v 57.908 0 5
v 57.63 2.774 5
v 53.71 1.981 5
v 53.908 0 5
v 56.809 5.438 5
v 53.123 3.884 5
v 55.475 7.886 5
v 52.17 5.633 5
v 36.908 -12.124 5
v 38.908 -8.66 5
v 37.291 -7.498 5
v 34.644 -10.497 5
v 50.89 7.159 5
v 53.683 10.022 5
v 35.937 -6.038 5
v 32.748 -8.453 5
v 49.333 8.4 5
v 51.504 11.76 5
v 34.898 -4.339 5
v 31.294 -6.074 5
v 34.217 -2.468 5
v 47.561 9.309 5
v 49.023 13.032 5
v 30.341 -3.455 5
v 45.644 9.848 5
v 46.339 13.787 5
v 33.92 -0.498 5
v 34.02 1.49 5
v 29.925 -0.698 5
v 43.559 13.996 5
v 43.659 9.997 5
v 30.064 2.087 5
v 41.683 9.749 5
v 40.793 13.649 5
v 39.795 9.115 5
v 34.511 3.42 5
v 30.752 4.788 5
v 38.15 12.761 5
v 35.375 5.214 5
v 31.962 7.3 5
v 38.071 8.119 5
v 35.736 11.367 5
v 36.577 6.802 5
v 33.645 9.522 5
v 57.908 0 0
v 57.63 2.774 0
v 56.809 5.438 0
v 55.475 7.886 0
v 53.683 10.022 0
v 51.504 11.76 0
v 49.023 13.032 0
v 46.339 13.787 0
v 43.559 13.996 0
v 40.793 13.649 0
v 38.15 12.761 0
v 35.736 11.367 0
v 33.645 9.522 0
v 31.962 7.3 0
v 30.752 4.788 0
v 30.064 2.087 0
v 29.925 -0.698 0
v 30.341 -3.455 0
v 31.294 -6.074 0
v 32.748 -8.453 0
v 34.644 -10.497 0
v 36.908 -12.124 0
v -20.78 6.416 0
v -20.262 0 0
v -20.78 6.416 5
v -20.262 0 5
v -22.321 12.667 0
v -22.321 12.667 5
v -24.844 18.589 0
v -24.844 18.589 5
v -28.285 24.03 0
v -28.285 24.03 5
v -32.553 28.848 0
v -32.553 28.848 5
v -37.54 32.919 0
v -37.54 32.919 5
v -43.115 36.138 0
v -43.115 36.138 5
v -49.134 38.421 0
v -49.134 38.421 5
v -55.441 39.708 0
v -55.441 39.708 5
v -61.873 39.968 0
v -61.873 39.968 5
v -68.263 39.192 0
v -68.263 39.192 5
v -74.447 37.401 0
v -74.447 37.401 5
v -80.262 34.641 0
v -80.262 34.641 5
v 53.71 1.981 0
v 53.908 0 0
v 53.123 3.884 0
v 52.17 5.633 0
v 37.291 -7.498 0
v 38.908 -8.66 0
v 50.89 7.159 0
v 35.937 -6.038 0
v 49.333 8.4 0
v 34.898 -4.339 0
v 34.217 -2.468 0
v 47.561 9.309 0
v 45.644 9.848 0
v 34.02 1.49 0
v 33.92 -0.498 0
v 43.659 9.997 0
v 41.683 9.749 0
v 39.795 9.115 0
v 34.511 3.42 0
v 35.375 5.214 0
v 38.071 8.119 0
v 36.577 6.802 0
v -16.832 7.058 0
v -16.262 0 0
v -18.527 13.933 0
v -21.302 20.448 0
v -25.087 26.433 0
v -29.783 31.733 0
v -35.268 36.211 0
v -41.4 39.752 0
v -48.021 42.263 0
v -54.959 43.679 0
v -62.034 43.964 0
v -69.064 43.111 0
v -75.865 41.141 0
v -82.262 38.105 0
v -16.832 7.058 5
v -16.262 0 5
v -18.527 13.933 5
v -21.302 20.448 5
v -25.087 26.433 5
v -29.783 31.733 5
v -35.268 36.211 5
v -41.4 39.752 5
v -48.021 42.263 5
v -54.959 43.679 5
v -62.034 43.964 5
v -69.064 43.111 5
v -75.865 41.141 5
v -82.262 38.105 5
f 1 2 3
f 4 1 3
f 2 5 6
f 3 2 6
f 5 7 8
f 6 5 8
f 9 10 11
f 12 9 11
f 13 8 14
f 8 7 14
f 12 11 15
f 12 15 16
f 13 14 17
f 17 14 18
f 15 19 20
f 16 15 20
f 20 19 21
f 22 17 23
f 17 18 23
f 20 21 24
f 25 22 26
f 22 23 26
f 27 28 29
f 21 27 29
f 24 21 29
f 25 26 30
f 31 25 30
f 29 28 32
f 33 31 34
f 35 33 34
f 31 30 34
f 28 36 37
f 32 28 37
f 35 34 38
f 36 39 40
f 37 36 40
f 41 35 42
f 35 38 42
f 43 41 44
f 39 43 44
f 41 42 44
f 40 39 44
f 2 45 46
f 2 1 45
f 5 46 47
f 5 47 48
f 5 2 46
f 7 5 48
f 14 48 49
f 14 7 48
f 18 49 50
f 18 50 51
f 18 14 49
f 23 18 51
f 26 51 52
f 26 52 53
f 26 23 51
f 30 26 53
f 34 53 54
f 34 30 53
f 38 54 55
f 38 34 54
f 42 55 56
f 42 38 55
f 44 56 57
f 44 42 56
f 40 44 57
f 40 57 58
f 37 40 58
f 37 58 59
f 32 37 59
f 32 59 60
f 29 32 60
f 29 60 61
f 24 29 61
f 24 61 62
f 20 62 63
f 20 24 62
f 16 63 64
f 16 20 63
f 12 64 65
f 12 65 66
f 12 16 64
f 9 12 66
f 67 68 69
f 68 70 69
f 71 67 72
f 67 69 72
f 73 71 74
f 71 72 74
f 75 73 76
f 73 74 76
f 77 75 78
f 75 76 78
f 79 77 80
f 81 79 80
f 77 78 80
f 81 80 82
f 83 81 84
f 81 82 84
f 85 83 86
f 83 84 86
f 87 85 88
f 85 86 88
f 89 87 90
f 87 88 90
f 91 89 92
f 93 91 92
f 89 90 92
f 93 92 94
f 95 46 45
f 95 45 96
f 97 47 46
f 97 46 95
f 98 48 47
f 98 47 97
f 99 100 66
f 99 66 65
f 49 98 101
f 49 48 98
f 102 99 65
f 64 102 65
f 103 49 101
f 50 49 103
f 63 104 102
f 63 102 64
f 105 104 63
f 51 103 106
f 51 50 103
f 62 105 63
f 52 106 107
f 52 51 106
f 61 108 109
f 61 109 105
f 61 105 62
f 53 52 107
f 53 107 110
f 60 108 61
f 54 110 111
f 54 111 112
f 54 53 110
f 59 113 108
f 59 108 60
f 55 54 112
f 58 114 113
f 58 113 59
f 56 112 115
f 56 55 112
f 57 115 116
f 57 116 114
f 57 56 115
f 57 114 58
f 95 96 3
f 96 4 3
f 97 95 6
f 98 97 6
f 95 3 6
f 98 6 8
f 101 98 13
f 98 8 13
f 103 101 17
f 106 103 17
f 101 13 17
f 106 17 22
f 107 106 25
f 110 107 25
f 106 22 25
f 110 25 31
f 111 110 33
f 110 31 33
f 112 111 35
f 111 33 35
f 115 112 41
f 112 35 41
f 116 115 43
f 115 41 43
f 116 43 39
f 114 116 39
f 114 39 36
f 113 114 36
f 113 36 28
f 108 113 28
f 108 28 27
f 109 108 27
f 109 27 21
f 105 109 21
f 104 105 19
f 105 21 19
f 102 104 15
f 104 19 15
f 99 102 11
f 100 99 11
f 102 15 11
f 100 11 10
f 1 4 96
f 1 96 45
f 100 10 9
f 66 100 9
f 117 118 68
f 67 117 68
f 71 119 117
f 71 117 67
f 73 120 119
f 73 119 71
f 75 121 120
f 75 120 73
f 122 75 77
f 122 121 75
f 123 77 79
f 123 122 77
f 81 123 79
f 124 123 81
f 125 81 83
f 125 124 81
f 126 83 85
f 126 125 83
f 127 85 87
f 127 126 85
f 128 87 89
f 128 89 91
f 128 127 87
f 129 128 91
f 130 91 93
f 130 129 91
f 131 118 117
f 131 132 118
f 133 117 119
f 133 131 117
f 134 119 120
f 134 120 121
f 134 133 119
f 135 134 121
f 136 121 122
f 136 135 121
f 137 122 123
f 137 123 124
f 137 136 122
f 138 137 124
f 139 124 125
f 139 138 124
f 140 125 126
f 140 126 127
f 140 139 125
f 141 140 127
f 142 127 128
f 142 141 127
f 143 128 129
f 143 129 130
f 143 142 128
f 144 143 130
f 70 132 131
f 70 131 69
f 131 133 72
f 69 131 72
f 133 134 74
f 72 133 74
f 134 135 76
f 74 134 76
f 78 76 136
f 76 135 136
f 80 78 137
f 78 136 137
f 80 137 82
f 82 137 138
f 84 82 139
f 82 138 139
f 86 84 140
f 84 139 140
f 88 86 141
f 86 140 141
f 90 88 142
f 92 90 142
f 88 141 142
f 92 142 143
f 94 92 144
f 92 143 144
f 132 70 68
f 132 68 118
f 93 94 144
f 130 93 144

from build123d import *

# Parameters (mm, degrees)
F0_W     = 4
F0_H     = 5
F1_ANGLE = 240
F2_W     = 4
F2_H     = 5
F3_ANGLE = 120


with BuildPart() as f1:
    # F0 (on Front) → F1 (revolve)
    with BuildSketch(Plane.XZ):
        with Locations((55.908015, 2.5)):
            Rectangle(F0_W, F0_H)
    revolve(axis=Axis((43.908015, 0, 7.11061), (0, 0, 1)), revolution_arc=F1_ANGLE)


with BuildPart() as f3:
    # F2 (on Front) → F3 (revolve)
    with BuildSketch(Plane.XZ):
        with Locations((-18.262419, 2.5)):
            Rectangle(F2_W, F2_H)
    revolve(axis=Axis((-60.262419, 0, 7.821671), (0, 0, 1)), revolution_arc=F3_ANGLE)


solid = Compound([f1.part, f3.part])
